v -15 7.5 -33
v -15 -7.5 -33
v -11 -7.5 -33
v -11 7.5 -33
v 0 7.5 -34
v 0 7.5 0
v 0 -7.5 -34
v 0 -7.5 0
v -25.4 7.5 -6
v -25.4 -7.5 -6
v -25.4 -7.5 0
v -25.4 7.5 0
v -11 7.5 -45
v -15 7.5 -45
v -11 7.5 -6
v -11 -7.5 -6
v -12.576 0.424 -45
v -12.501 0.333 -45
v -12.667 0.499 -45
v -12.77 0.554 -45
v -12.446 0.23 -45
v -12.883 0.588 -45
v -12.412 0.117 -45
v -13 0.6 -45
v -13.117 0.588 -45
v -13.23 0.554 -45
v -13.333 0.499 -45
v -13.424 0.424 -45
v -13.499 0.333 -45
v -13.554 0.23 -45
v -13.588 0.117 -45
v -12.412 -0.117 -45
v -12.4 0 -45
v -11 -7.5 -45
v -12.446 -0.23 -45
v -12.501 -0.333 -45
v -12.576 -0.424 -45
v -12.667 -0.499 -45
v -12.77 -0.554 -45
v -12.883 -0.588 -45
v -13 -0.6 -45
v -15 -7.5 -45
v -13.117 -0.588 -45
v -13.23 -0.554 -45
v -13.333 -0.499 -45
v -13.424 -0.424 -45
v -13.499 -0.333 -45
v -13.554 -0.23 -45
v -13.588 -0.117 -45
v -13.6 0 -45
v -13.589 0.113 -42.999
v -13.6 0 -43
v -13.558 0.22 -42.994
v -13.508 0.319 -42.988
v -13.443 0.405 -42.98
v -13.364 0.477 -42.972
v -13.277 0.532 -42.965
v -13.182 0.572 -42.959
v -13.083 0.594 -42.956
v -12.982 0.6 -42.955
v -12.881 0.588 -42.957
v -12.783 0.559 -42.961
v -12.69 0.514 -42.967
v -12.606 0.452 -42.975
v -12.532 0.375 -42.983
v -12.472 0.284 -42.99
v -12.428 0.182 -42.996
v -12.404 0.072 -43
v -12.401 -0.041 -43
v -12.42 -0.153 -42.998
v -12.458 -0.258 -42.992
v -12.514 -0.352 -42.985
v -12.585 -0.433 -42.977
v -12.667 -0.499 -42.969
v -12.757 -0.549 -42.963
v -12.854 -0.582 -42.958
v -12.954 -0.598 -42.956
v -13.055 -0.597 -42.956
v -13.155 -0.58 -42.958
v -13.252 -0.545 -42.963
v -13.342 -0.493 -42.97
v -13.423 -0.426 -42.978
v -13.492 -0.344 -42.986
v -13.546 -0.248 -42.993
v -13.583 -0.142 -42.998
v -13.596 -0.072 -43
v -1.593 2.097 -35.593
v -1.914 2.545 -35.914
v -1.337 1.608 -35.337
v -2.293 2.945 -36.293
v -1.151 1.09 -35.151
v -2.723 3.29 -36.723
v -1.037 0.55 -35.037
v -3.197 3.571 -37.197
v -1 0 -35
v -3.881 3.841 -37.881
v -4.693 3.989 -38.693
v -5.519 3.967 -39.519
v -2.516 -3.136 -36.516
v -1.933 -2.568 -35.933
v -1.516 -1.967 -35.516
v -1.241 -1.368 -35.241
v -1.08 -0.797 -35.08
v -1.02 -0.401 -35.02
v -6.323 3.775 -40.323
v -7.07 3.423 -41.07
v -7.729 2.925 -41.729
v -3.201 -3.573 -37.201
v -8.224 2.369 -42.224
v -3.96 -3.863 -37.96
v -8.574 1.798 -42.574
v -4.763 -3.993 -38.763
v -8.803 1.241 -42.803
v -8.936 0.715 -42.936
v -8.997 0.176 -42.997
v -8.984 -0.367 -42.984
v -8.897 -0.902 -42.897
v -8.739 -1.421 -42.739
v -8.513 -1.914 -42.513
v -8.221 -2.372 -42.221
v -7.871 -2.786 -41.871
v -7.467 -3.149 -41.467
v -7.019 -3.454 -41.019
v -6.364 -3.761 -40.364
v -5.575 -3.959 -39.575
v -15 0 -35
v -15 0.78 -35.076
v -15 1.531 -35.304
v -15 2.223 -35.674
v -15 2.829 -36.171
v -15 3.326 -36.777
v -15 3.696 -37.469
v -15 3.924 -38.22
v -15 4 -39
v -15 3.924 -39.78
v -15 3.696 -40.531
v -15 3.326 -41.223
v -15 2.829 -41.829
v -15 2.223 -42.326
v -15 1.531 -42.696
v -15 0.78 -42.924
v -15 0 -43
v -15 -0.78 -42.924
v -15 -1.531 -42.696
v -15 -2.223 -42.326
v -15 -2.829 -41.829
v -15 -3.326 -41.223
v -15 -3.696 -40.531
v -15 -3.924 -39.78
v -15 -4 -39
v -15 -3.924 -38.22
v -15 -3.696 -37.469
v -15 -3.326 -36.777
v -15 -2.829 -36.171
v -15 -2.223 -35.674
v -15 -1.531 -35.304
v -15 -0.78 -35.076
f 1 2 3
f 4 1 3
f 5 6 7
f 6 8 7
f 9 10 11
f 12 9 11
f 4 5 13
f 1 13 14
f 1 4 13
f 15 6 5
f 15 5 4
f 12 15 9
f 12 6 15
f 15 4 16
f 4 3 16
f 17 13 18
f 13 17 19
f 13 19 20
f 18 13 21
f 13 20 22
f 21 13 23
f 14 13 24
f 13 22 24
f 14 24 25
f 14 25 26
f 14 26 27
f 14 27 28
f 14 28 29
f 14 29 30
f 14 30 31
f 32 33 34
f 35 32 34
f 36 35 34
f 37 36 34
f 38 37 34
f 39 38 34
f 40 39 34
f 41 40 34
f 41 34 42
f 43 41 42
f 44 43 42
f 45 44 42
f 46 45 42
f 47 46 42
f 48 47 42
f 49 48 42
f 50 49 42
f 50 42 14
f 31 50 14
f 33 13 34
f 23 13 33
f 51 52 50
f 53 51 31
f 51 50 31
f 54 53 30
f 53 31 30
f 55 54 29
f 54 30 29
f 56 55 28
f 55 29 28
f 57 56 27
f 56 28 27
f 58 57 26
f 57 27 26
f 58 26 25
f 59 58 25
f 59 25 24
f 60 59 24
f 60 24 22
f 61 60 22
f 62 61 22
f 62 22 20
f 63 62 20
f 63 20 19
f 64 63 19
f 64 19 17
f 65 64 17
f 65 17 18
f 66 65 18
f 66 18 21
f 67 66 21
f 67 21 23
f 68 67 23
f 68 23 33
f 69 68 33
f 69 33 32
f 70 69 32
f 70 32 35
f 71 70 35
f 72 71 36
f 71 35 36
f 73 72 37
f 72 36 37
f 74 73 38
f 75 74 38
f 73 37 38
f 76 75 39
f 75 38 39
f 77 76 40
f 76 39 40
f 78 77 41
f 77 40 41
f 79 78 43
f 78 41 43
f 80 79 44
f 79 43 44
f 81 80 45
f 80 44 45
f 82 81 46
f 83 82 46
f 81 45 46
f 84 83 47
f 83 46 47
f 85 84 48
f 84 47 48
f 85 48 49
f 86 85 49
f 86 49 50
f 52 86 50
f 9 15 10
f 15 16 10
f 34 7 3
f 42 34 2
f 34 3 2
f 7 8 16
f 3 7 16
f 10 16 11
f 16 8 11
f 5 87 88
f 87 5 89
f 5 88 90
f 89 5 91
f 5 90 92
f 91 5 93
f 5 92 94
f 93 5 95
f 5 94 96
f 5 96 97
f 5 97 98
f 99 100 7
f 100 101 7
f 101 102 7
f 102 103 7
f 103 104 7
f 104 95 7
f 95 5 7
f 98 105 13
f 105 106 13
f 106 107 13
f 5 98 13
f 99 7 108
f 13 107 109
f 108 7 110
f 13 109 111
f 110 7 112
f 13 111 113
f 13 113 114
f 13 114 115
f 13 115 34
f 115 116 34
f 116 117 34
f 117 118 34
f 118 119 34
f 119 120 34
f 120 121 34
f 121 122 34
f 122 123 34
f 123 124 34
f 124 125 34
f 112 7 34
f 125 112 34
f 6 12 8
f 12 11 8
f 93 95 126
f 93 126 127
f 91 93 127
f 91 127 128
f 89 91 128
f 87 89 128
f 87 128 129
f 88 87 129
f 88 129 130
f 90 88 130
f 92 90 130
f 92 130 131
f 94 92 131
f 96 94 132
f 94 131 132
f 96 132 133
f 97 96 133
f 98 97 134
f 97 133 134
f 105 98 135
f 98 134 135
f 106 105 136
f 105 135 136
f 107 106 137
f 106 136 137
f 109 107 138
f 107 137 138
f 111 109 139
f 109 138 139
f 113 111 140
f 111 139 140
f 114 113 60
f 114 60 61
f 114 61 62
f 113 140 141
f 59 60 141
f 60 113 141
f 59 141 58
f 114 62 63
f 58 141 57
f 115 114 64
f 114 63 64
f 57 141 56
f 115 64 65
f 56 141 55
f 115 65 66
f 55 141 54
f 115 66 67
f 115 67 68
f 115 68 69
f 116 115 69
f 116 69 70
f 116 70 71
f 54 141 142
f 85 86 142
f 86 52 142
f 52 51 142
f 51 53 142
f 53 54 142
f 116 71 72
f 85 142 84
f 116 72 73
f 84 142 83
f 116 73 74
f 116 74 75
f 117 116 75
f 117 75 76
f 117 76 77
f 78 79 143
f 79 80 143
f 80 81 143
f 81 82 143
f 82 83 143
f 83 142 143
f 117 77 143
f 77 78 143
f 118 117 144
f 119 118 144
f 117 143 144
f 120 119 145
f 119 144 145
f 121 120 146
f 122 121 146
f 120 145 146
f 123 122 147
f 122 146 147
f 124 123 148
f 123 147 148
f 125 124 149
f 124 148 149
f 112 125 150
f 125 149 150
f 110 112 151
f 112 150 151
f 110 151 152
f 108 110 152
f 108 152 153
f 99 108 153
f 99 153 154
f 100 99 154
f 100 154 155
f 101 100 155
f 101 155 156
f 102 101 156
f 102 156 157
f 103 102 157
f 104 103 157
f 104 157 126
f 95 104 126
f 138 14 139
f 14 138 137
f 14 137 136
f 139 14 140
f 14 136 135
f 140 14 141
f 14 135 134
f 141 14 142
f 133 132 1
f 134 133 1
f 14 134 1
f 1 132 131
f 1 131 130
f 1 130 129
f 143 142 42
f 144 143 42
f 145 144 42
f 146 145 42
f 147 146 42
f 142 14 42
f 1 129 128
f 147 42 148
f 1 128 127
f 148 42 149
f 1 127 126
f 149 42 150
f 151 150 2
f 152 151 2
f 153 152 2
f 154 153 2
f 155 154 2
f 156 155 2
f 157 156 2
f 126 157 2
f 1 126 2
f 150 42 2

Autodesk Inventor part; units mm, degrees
ref_plane "YZ Plane" through (0, 0, 0) normal (1, 0, 0) x (0, 1, 0)
ref_plane "XZ Plane" through (0, 0, 0) normal (0, 1, 0) x (-1, 0, 0)
ref_plane "XY Plane" through (0, 0, 0) normal (0, 0, 1) x (1, 0, 0)
sketch "Sketch1" plane through (0, 0, 0) normal (0, 1, 0) x (-1, 0, 0)
  line L0 (0, 0) -> (0, -34)
  line L1 (0, -34) -> (11, -45)
  line L2 (11, -45) -> (15, -45)
  line L3 (15, -45) -> (15, -33)
  line L4 (6.7118, 0) -> (0, 0)
  line L5 (15, -33) -> (11, -33)
  line L6 (11, -33) -> (11, -6)
  line L7 (11, -6) -> (25.4, -6)
  line L8 (25.4, -6) -> (25.4, 0)
  line L9 (25.4, 0) -> (6.7118, 0)
  dimension "d0" = 135
  dimension "d1" = 15
  dimension "d2" = 4
  dimension "d13" = 4
  dimension "d14" = 25.4
  dimension "d15" = 6
  dimension "d16" = 12
  dimension "d17" = 45
extrude "Extrusion1" add sketch "Sketch1" along normal mid plane 15
sketch "Sketch2" plane through (-15, -7.5, 0) normal (-1, 0, 0) x (0, 0, 1)
  line L0 (-45, 0) -> (-45, 15) projected
  circle A0 centre (-39, 7.5) radius 4.0005
  point P0 (0, 7.5)
  point P1 (-45, 7.5)
  dimension "d6" = 6
  dimension "d7" = 8.001
extrude "Extrusion2" cut sketch "Sketch2" against normal through all
sketch "Sketch3" plane through (-11, 7.5, -45) normal (0, 0, -1) x (-1, 0, 0)
  line L0 (4, -15) -> (4, 0) projected
  line L1 (4, -15) -> (0, -15) projected
  circle A0 centre (2, -7.5) radius 0.6
  point P0 (-11, -7.5)
  point P1 (2, -15)
  point P2 (4, -7.5)
  dimension "d10" = 1.2
extrude "Extrusion3" cut sketch "Sketch3" against normal up to next
properties part number "focus mount"
